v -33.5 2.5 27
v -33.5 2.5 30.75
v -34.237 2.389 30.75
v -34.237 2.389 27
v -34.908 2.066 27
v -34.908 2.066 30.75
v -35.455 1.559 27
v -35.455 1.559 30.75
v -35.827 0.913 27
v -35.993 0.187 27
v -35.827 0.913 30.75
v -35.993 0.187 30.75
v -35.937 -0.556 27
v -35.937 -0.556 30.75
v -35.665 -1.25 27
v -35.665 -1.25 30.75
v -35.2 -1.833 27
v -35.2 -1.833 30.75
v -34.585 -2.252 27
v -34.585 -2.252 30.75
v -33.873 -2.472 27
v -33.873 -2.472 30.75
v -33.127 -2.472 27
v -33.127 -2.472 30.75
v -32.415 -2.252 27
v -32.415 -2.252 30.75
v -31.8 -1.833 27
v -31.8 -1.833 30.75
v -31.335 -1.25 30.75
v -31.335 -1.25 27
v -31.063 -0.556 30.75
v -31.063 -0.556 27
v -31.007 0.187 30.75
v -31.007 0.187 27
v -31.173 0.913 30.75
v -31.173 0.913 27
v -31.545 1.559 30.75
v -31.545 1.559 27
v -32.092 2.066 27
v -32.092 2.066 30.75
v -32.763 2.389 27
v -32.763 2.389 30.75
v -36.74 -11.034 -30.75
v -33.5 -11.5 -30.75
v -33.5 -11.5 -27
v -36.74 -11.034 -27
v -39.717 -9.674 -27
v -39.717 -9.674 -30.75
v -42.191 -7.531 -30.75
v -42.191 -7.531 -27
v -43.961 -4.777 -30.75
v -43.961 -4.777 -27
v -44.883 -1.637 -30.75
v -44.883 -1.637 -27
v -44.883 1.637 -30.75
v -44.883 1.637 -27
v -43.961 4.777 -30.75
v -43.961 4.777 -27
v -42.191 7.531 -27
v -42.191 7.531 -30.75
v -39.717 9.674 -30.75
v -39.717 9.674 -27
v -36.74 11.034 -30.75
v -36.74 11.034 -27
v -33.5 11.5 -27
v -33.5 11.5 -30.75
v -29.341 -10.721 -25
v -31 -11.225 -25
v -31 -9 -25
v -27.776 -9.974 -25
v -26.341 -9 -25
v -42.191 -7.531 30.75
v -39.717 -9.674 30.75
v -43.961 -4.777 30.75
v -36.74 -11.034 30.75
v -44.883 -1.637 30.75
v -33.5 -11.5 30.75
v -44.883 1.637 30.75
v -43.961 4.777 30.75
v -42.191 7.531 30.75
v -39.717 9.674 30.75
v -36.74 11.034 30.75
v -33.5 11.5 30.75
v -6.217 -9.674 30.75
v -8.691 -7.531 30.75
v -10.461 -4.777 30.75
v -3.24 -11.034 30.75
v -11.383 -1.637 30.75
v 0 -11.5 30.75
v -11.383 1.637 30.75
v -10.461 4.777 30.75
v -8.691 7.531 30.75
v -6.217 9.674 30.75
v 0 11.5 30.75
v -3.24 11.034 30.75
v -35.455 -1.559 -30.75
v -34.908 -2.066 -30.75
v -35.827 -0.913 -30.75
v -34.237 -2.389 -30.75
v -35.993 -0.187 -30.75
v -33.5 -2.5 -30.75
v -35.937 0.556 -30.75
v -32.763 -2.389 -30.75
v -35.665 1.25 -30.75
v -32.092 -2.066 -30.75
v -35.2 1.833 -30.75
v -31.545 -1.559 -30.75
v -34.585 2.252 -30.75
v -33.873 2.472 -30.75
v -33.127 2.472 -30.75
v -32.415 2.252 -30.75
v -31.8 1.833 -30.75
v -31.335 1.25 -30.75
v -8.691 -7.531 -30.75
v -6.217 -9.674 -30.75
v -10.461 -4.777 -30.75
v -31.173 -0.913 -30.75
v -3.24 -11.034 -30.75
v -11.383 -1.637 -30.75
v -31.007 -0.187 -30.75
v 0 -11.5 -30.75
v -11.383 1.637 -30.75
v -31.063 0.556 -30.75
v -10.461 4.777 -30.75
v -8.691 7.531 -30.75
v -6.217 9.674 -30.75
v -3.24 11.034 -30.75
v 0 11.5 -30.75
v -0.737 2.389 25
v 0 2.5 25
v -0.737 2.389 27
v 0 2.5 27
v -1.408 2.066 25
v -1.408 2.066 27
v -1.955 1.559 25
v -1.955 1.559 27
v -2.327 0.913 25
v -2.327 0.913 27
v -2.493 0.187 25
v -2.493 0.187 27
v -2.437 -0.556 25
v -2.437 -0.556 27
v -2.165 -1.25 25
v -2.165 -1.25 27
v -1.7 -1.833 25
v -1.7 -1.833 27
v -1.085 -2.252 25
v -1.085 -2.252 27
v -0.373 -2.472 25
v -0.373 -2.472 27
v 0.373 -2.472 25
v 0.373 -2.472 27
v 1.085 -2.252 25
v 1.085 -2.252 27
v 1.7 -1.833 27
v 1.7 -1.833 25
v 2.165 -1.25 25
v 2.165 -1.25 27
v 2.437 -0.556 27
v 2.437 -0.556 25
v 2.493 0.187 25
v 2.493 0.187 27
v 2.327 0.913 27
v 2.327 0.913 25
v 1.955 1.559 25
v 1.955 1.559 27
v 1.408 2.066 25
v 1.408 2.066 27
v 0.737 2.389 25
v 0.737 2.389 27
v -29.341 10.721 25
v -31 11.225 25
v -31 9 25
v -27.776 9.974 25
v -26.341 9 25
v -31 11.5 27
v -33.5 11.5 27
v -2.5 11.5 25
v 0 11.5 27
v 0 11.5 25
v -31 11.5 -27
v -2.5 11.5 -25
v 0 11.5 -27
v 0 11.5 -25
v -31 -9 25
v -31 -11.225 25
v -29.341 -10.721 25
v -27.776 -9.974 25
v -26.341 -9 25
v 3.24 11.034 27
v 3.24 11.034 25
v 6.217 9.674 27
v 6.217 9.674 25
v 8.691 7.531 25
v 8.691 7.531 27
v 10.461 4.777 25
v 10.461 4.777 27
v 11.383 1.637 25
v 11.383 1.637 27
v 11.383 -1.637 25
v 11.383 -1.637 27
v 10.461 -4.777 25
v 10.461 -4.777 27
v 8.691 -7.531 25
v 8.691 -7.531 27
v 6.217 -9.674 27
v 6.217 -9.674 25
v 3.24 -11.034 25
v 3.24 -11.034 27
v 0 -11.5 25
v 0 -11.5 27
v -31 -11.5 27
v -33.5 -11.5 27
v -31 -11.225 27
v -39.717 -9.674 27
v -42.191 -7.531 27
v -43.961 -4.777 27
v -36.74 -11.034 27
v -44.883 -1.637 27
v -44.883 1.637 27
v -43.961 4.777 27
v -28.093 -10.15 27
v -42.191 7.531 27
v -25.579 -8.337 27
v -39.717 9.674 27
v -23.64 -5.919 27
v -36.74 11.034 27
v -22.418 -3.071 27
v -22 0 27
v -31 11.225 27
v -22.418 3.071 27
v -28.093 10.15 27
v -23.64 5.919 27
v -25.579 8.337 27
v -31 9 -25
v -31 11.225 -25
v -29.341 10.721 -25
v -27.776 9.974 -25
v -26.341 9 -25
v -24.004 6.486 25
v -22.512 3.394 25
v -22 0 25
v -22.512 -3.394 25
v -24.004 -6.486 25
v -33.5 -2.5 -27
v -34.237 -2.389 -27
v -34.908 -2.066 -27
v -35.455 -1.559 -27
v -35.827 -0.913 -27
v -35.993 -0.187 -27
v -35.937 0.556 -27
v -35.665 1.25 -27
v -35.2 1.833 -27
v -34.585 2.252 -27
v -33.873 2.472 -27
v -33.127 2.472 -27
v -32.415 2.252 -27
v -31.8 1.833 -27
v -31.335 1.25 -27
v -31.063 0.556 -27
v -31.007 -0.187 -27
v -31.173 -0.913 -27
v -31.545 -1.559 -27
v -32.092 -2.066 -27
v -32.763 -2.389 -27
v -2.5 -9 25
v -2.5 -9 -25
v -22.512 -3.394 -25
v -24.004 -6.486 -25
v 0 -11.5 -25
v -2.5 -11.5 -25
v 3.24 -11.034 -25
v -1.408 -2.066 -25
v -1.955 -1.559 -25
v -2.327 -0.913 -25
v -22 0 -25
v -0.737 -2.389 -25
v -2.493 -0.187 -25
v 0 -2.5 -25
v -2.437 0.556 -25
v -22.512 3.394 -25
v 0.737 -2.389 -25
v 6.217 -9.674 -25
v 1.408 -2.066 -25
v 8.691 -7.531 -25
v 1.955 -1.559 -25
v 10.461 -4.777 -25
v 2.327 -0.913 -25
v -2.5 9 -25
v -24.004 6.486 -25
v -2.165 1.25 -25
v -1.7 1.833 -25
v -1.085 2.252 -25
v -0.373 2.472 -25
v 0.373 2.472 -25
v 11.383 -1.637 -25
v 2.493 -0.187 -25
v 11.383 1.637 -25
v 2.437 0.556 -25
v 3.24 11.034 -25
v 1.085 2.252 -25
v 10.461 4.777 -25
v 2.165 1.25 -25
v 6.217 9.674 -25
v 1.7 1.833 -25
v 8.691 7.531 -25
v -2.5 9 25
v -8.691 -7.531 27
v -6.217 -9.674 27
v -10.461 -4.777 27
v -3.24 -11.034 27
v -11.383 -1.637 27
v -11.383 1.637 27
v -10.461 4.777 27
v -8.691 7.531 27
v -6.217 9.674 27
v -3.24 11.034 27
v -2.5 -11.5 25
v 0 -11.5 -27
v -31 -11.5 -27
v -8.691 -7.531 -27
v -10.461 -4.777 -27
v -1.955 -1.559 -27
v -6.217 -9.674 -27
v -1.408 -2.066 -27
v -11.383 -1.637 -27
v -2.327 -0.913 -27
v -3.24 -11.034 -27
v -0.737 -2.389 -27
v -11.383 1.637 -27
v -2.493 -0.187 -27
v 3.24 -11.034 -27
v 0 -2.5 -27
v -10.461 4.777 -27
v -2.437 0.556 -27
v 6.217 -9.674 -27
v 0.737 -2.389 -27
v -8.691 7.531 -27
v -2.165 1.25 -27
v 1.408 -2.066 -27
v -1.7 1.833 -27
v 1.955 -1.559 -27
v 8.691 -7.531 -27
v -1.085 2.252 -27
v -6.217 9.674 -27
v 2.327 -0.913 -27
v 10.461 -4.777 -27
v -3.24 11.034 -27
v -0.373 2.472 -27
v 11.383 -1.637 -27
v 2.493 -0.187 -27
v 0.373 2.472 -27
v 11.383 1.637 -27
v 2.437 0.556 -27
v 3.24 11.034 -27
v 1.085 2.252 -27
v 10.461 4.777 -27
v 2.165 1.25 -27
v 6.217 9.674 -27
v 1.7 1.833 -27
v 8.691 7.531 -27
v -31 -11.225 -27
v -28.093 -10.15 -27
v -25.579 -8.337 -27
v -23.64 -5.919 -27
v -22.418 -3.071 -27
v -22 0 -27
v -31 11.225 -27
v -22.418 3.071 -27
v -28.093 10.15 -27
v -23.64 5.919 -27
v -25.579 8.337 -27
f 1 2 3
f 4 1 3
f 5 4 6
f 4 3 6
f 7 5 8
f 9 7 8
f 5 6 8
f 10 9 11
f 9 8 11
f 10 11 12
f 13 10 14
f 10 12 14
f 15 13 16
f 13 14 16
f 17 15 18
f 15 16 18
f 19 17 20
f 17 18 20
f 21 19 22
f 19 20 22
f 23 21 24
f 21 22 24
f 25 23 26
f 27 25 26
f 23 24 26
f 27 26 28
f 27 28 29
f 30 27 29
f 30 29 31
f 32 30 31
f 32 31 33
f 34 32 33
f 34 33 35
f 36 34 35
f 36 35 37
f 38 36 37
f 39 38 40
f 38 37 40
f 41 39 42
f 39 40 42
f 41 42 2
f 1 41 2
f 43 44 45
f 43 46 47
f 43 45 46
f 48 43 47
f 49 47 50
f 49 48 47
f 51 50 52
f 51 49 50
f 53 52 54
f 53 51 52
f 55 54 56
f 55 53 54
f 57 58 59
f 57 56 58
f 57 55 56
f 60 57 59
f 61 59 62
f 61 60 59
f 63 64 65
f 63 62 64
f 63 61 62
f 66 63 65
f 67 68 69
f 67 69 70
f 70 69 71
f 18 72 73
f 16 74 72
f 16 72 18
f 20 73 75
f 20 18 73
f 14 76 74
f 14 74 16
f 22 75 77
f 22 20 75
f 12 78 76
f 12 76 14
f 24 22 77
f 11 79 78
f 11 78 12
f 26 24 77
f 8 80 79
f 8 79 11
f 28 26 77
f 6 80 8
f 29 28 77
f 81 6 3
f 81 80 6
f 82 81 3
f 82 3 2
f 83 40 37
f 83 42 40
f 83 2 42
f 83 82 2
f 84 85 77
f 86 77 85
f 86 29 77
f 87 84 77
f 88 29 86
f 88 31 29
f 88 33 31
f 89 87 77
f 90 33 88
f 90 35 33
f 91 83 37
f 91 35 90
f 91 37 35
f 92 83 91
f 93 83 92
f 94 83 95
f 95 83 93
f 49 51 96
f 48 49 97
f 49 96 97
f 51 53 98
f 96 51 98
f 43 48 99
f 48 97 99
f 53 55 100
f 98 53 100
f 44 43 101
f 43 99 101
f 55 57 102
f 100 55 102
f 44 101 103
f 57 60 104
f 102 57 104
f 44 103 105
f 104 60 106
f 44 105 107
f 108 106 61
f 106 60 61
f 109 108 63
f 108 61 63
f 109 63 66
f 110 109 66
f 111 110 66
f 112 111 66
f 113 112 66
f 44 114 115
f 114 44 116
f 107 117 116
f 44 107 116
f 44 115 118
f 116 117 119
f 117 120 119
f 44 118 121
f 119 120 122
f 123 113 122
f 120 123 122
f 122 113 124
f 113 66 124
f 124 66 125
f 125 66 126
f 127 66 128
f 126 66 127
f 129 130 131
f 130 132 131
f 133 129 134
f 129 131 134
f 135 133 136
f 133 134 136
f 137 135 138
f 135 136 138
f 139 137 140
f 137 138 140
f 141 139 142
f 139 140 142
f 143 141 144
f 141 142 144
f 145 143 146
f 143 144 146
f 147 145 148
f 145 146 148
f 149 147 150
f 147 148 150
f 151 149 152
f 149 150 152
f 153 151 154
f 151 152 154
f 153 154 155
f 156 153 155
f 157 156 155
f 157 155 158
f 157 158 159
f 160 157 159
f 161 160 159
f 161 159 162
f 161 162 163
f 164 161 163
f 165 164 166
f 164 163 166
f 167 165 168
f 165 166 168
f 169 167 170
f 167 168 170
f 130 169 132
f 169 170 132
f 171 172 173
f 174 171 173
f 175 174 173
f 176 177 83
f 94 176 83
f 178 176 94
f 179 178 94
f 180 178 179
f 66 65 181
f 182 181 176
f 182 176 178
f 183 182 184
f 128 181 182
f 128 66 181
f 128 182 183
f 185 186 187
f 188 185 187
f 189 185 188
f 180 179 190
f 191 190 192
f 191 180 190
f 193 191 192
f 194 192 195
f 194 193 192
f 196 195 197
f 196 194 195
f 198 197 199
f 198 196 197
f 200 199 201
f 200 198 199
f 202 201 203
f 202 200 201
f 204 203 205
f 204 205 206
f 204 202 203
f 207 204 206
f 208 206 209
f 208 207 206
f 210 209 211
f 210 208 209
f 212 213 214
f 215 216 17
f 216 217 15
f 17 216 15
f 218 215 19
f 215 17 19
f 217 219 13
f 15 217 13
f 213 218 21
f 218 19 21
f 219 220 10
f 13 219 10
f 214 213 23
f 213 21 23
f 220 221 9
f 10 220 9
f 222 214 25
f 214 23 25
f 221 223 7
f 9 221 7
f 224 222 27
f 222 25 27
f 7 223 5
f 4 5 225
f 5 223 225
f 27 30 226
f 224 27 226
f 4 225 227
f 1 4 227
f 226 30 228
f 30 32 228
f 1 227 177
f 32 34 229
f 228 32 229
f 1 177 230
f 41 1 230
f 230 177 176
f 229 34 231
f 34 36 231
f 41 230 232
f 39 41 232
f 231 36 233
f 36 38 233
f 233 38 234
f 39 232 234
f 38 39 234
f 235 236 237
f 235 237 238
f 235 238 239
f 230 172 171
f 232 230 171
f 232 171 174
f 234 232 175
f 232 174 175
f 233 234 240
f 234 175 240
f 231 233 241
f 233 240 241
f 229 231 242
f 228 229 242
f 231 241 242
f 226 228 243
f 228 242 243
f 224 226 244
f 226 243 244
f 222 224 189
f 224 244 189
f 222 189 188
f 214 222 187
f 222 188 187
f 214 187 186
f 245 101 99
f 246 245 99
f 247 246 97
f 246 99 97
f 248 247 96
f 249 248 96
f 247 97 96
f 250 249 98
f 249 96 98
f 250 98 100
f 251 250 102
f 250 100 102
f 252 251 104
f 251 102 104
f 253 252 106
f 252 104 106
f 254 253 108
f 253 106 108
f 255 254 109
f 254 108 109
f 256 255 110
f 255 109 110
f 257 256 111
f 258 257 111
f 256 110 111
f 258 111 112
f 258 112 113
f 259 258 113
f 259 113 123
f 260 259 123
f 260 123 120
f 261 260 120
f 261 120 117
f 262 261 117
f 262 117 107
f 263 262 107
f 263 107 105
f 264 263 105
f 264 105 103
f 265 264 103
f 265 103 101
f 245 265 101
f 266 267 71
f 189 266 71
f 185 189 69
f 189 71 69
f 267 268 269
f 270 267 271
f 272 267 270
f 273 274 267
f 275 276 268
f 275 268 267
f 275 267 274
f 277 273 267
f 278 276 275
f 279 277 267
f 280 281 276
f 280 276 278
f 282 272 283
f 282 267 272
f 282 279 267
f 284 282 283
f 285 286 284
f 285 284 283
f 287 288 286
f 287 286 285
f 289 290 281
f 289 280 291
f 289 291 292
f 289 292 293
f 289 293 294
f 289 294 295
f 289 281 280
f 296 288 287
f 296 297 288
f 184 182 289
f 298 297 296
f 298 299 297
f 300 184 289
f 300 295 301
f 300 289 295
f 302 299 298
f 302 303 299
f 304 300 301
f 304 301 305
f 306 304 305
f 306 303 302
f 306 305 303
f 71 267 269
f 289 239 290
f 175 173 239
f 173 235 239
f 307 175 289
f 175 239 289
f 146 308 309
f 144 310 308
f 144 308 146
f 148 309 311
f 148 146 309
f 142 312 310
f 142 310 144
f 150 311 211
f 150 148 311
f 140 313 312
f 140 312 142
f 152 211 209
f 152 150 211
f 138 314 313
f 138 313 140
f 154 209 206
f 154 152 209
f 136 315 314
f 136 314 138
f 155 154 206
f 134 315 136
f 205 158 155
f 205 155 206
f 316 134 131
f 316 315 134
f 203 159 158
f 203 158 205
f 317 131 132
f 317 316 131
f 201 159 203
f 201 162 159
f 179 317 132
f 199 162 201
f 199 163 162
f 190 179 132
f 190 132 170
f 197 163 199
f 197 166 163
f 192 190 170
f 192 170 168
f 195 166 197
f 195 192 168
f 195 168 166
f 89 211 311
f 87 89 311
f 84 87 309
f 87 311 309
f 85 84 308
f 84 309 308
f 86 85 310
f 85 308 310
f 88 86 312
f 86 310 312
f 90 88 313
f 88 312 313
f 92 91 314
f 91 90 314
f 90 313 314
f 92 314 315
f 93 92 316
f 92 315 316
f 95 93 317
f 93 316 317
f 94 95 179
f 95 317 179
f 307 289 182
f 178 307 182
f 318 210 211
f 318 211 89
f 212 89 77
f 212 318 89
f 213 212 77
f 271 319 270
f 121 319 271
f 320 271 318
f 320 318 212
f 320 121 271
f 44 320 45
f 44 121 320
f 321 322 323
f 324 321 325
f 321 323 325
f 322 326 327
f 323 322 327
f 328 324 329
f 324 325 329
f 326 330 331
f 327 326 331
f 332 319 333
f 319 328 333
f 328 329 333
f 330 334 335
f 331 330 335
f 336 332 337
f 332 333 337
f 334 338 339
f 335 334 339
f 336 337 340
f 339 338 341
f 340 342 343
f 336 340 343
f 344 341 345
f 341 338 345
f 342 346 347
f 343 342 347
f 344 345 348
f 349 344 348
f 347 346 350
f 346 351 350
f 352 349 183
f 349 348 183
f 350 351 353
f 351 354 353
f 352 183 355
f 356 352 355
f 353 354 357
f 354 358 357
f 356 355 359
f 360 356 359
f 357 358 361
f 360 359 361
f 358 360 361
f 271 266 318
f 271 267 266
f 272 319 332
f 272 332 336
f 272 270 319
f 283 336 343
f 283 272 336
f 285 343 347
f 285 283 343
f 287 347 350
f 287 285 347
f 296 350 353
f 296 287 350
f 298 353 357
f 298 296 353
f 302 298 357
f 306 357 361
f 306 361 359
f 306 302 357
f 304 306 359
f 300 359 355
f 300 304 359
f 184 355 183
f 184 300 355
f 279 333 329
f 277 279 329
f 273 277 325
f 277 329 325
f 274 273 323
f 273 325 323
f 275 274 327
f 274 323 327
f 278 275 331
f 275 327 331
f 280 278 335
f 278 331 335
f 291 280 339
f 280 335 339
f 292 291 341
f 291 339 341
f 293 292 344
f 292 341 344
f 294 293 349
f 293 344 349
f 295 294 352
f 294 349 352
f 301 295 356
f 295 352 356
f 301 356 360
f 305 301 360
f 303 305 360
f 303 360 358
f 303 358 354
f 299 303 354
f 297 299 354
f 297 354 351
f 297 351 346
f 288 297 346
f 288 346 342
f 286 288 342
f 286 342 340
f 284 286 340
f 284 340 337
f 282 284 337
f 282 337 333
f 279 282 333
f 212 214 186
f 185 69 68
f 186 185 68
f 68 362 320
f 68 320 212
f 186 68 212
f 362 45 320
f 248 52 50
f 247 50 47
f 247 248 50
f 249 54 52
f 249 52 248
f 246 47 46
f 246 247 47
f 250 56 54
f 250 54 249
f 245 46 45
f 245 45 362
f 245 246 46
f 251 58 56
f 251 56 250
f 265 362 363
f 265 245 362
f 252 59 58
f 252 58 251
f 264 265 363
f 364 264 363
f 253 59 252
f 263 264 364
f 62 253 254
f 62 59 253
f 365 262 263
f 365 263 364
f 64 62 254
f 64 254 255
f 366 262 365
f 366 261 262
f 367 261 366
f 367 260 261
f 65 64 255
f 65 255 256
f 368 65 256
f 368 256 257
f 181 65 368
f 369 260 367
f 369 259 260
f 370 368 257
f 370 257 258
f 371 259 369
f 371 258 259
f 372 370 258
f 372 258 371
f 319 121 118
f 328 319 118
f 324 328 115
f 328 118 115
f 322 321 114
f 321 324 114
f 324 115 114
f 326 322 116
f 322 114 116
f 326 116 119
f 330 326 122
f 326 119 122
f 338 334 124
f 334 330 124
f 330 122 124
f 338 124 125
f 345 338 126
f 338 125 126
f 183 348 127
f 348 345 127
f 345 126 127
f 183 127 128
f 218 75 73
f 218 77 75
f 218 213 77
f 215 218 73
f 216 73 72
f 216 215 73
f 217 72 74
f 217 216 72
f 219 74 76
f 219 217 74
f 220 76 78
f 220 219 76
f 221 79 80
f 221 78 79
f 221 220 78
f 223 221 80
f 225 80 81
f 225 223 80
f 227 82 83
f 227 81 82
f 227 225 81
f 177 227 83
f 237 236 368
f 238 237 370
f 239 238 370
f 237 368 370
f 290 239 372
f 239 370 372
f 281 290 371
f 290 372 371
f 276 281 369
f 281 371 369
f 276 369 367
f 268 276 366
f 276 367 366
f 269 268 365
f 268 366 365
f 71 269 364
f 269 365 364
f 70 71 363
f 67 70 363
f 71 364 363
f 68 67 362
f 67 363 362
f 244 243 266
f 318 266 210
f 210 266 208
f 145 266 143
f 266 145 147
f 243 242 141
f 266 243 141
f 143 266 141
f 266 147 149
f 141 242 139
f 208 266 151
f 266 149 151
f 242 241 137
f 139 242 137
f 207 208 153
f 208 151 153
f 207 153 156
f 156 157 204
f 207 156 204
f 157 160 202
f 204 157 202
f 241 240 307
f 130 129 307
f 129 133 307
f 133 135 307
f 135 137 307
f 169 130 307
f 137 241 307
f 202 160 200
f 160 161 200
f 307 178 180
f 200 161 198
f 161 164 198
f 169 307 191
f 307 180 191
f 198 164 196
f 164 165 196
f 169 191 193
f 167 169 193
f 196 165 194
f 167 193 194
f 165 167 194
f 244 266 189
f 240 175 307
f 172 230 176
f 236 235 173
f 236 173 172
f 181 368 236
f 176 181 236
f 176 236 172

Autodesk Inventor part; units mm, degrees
ref_plane "YZ Plane" through (0, 0, 0) normal (1, 0, 0) x (0, 1, 0)
ref_plane "XZ Plane" through (0, 0, 0) normal (0, 1, 0) x (-1, 0, 0)
ref_plane "XY Plane" through (0, 0, 0) normal (0, 0, 1) x (1, 0, 0)
sketch "Sketch1" plane through (0, 0, 0) normal (0, 0, 1) x (1, 0, 0)
  arc A0 (0, 11.5) -> (0, -11.5) centre (0, 0) ccw
  line L0 (0, 0) -> (-33.5, 0) construction
  line L1 (-33.5, 11.5) -> (0, 11.5)
  line L2 (0, 11.5) -> (0, -11.5)
  line L3 (0, -11.5) -> (-33.5, -11.5)
  line L4 (-33.5, -11.5) -> (-33.5, 11.5)
  line L5 (-31, 9) -> (-2.5, 9)
  line L6 (-2.5, 9) -> (-2.5, -9)
  line L7 (-2.5, -9) -> (-31, -9)
  line L8 (-31, -9) -> (-31, 9)
  arc A1 (-33.5, -11.5) -> (-33.5, 11.5) centre (-33.5, 0) ccw
  arc A2 (-33.5, 11.5) -> (-33.5, -11.5) centre (-33.5, 0) ccw
  arc A3 (0, -11.5) -> (0, 11.5) centre (0, 0) ccw
  line L9 (-31, 9) -> (-31, 11.5)
  line L10 (-2.5, 9) -> (-2.5, 11.5)
  line L11 (-31, -9) -> (-31, -11.5)
  line L12 (-2.5, -9) -> (-2.5, -11.5)
  dimension "d0" = 2.5
  dimension "d1" = 2.5
  dimension "d2" = 2.5
  dimension "d3" = 2.5
  dimension "d4" = 18
  dimension "d5" = 33.5
extrude "Extrusion3" add sketch "Sketch1" along normal mid plane 61.5 contours A0 L10 L1 | A0 L5 A1 L9 L1 L10 | L3 L12 A0 | A0 L7 A1 L5 | L9 A1 L1 | L12 L3 L11 A1 L7 A0 | A1 L7 L8 L5 | L5 L9 A1 | A1 L9 L8 L11 L4 | L4 A2 | L3 A1 L11 | A1 L11 L7
extrude "Extrusion4" add sketch "Sketch1" along normal mid plane 54 contours L2 A0 L12 L6 L10 | A3 L2 | L10 L5 A0 | L5 L6 L7 A0 | A0 L7 L12
extrude "Extrusion5" cut sketch "Sketch1" along normal mid plane 50
extrude "Extrusion7" cut sketch "Sketch1" along normal mid plane 54 contours L9 A1 L1 | A1 L7 L8 L5 | L5 L9 A1 | A1 L9 L8 L11 L4 | L4 A2 | L3 A1 L11 | A1 L11 L7
extrude "Extrusion6" add sketch "Sketch1" along normal mid plane 50 contours L10 L5 A0 | A0 L5 A1 L9 L1 L10 | L12 L3 L11 A1 L7 A0 | A0 L7 L12 | L5 L9 A1 | A1 L11 L7
hole "Hole1" at (-33.5, 0, 0) at (0, 0, 0) direction (0, 0, 1) diameter 5 end through all
hole "Hole2" at (0, 0, 0) at (-33.5, 0, 0) direction (0, 0, -1) diameter 5 end through all
equation "\"d1\" = d0"
equation "\"d2\" = d0"
equation "\"d3\" = d0"
properties part number "carrier-link" material "ABS Plastic"
